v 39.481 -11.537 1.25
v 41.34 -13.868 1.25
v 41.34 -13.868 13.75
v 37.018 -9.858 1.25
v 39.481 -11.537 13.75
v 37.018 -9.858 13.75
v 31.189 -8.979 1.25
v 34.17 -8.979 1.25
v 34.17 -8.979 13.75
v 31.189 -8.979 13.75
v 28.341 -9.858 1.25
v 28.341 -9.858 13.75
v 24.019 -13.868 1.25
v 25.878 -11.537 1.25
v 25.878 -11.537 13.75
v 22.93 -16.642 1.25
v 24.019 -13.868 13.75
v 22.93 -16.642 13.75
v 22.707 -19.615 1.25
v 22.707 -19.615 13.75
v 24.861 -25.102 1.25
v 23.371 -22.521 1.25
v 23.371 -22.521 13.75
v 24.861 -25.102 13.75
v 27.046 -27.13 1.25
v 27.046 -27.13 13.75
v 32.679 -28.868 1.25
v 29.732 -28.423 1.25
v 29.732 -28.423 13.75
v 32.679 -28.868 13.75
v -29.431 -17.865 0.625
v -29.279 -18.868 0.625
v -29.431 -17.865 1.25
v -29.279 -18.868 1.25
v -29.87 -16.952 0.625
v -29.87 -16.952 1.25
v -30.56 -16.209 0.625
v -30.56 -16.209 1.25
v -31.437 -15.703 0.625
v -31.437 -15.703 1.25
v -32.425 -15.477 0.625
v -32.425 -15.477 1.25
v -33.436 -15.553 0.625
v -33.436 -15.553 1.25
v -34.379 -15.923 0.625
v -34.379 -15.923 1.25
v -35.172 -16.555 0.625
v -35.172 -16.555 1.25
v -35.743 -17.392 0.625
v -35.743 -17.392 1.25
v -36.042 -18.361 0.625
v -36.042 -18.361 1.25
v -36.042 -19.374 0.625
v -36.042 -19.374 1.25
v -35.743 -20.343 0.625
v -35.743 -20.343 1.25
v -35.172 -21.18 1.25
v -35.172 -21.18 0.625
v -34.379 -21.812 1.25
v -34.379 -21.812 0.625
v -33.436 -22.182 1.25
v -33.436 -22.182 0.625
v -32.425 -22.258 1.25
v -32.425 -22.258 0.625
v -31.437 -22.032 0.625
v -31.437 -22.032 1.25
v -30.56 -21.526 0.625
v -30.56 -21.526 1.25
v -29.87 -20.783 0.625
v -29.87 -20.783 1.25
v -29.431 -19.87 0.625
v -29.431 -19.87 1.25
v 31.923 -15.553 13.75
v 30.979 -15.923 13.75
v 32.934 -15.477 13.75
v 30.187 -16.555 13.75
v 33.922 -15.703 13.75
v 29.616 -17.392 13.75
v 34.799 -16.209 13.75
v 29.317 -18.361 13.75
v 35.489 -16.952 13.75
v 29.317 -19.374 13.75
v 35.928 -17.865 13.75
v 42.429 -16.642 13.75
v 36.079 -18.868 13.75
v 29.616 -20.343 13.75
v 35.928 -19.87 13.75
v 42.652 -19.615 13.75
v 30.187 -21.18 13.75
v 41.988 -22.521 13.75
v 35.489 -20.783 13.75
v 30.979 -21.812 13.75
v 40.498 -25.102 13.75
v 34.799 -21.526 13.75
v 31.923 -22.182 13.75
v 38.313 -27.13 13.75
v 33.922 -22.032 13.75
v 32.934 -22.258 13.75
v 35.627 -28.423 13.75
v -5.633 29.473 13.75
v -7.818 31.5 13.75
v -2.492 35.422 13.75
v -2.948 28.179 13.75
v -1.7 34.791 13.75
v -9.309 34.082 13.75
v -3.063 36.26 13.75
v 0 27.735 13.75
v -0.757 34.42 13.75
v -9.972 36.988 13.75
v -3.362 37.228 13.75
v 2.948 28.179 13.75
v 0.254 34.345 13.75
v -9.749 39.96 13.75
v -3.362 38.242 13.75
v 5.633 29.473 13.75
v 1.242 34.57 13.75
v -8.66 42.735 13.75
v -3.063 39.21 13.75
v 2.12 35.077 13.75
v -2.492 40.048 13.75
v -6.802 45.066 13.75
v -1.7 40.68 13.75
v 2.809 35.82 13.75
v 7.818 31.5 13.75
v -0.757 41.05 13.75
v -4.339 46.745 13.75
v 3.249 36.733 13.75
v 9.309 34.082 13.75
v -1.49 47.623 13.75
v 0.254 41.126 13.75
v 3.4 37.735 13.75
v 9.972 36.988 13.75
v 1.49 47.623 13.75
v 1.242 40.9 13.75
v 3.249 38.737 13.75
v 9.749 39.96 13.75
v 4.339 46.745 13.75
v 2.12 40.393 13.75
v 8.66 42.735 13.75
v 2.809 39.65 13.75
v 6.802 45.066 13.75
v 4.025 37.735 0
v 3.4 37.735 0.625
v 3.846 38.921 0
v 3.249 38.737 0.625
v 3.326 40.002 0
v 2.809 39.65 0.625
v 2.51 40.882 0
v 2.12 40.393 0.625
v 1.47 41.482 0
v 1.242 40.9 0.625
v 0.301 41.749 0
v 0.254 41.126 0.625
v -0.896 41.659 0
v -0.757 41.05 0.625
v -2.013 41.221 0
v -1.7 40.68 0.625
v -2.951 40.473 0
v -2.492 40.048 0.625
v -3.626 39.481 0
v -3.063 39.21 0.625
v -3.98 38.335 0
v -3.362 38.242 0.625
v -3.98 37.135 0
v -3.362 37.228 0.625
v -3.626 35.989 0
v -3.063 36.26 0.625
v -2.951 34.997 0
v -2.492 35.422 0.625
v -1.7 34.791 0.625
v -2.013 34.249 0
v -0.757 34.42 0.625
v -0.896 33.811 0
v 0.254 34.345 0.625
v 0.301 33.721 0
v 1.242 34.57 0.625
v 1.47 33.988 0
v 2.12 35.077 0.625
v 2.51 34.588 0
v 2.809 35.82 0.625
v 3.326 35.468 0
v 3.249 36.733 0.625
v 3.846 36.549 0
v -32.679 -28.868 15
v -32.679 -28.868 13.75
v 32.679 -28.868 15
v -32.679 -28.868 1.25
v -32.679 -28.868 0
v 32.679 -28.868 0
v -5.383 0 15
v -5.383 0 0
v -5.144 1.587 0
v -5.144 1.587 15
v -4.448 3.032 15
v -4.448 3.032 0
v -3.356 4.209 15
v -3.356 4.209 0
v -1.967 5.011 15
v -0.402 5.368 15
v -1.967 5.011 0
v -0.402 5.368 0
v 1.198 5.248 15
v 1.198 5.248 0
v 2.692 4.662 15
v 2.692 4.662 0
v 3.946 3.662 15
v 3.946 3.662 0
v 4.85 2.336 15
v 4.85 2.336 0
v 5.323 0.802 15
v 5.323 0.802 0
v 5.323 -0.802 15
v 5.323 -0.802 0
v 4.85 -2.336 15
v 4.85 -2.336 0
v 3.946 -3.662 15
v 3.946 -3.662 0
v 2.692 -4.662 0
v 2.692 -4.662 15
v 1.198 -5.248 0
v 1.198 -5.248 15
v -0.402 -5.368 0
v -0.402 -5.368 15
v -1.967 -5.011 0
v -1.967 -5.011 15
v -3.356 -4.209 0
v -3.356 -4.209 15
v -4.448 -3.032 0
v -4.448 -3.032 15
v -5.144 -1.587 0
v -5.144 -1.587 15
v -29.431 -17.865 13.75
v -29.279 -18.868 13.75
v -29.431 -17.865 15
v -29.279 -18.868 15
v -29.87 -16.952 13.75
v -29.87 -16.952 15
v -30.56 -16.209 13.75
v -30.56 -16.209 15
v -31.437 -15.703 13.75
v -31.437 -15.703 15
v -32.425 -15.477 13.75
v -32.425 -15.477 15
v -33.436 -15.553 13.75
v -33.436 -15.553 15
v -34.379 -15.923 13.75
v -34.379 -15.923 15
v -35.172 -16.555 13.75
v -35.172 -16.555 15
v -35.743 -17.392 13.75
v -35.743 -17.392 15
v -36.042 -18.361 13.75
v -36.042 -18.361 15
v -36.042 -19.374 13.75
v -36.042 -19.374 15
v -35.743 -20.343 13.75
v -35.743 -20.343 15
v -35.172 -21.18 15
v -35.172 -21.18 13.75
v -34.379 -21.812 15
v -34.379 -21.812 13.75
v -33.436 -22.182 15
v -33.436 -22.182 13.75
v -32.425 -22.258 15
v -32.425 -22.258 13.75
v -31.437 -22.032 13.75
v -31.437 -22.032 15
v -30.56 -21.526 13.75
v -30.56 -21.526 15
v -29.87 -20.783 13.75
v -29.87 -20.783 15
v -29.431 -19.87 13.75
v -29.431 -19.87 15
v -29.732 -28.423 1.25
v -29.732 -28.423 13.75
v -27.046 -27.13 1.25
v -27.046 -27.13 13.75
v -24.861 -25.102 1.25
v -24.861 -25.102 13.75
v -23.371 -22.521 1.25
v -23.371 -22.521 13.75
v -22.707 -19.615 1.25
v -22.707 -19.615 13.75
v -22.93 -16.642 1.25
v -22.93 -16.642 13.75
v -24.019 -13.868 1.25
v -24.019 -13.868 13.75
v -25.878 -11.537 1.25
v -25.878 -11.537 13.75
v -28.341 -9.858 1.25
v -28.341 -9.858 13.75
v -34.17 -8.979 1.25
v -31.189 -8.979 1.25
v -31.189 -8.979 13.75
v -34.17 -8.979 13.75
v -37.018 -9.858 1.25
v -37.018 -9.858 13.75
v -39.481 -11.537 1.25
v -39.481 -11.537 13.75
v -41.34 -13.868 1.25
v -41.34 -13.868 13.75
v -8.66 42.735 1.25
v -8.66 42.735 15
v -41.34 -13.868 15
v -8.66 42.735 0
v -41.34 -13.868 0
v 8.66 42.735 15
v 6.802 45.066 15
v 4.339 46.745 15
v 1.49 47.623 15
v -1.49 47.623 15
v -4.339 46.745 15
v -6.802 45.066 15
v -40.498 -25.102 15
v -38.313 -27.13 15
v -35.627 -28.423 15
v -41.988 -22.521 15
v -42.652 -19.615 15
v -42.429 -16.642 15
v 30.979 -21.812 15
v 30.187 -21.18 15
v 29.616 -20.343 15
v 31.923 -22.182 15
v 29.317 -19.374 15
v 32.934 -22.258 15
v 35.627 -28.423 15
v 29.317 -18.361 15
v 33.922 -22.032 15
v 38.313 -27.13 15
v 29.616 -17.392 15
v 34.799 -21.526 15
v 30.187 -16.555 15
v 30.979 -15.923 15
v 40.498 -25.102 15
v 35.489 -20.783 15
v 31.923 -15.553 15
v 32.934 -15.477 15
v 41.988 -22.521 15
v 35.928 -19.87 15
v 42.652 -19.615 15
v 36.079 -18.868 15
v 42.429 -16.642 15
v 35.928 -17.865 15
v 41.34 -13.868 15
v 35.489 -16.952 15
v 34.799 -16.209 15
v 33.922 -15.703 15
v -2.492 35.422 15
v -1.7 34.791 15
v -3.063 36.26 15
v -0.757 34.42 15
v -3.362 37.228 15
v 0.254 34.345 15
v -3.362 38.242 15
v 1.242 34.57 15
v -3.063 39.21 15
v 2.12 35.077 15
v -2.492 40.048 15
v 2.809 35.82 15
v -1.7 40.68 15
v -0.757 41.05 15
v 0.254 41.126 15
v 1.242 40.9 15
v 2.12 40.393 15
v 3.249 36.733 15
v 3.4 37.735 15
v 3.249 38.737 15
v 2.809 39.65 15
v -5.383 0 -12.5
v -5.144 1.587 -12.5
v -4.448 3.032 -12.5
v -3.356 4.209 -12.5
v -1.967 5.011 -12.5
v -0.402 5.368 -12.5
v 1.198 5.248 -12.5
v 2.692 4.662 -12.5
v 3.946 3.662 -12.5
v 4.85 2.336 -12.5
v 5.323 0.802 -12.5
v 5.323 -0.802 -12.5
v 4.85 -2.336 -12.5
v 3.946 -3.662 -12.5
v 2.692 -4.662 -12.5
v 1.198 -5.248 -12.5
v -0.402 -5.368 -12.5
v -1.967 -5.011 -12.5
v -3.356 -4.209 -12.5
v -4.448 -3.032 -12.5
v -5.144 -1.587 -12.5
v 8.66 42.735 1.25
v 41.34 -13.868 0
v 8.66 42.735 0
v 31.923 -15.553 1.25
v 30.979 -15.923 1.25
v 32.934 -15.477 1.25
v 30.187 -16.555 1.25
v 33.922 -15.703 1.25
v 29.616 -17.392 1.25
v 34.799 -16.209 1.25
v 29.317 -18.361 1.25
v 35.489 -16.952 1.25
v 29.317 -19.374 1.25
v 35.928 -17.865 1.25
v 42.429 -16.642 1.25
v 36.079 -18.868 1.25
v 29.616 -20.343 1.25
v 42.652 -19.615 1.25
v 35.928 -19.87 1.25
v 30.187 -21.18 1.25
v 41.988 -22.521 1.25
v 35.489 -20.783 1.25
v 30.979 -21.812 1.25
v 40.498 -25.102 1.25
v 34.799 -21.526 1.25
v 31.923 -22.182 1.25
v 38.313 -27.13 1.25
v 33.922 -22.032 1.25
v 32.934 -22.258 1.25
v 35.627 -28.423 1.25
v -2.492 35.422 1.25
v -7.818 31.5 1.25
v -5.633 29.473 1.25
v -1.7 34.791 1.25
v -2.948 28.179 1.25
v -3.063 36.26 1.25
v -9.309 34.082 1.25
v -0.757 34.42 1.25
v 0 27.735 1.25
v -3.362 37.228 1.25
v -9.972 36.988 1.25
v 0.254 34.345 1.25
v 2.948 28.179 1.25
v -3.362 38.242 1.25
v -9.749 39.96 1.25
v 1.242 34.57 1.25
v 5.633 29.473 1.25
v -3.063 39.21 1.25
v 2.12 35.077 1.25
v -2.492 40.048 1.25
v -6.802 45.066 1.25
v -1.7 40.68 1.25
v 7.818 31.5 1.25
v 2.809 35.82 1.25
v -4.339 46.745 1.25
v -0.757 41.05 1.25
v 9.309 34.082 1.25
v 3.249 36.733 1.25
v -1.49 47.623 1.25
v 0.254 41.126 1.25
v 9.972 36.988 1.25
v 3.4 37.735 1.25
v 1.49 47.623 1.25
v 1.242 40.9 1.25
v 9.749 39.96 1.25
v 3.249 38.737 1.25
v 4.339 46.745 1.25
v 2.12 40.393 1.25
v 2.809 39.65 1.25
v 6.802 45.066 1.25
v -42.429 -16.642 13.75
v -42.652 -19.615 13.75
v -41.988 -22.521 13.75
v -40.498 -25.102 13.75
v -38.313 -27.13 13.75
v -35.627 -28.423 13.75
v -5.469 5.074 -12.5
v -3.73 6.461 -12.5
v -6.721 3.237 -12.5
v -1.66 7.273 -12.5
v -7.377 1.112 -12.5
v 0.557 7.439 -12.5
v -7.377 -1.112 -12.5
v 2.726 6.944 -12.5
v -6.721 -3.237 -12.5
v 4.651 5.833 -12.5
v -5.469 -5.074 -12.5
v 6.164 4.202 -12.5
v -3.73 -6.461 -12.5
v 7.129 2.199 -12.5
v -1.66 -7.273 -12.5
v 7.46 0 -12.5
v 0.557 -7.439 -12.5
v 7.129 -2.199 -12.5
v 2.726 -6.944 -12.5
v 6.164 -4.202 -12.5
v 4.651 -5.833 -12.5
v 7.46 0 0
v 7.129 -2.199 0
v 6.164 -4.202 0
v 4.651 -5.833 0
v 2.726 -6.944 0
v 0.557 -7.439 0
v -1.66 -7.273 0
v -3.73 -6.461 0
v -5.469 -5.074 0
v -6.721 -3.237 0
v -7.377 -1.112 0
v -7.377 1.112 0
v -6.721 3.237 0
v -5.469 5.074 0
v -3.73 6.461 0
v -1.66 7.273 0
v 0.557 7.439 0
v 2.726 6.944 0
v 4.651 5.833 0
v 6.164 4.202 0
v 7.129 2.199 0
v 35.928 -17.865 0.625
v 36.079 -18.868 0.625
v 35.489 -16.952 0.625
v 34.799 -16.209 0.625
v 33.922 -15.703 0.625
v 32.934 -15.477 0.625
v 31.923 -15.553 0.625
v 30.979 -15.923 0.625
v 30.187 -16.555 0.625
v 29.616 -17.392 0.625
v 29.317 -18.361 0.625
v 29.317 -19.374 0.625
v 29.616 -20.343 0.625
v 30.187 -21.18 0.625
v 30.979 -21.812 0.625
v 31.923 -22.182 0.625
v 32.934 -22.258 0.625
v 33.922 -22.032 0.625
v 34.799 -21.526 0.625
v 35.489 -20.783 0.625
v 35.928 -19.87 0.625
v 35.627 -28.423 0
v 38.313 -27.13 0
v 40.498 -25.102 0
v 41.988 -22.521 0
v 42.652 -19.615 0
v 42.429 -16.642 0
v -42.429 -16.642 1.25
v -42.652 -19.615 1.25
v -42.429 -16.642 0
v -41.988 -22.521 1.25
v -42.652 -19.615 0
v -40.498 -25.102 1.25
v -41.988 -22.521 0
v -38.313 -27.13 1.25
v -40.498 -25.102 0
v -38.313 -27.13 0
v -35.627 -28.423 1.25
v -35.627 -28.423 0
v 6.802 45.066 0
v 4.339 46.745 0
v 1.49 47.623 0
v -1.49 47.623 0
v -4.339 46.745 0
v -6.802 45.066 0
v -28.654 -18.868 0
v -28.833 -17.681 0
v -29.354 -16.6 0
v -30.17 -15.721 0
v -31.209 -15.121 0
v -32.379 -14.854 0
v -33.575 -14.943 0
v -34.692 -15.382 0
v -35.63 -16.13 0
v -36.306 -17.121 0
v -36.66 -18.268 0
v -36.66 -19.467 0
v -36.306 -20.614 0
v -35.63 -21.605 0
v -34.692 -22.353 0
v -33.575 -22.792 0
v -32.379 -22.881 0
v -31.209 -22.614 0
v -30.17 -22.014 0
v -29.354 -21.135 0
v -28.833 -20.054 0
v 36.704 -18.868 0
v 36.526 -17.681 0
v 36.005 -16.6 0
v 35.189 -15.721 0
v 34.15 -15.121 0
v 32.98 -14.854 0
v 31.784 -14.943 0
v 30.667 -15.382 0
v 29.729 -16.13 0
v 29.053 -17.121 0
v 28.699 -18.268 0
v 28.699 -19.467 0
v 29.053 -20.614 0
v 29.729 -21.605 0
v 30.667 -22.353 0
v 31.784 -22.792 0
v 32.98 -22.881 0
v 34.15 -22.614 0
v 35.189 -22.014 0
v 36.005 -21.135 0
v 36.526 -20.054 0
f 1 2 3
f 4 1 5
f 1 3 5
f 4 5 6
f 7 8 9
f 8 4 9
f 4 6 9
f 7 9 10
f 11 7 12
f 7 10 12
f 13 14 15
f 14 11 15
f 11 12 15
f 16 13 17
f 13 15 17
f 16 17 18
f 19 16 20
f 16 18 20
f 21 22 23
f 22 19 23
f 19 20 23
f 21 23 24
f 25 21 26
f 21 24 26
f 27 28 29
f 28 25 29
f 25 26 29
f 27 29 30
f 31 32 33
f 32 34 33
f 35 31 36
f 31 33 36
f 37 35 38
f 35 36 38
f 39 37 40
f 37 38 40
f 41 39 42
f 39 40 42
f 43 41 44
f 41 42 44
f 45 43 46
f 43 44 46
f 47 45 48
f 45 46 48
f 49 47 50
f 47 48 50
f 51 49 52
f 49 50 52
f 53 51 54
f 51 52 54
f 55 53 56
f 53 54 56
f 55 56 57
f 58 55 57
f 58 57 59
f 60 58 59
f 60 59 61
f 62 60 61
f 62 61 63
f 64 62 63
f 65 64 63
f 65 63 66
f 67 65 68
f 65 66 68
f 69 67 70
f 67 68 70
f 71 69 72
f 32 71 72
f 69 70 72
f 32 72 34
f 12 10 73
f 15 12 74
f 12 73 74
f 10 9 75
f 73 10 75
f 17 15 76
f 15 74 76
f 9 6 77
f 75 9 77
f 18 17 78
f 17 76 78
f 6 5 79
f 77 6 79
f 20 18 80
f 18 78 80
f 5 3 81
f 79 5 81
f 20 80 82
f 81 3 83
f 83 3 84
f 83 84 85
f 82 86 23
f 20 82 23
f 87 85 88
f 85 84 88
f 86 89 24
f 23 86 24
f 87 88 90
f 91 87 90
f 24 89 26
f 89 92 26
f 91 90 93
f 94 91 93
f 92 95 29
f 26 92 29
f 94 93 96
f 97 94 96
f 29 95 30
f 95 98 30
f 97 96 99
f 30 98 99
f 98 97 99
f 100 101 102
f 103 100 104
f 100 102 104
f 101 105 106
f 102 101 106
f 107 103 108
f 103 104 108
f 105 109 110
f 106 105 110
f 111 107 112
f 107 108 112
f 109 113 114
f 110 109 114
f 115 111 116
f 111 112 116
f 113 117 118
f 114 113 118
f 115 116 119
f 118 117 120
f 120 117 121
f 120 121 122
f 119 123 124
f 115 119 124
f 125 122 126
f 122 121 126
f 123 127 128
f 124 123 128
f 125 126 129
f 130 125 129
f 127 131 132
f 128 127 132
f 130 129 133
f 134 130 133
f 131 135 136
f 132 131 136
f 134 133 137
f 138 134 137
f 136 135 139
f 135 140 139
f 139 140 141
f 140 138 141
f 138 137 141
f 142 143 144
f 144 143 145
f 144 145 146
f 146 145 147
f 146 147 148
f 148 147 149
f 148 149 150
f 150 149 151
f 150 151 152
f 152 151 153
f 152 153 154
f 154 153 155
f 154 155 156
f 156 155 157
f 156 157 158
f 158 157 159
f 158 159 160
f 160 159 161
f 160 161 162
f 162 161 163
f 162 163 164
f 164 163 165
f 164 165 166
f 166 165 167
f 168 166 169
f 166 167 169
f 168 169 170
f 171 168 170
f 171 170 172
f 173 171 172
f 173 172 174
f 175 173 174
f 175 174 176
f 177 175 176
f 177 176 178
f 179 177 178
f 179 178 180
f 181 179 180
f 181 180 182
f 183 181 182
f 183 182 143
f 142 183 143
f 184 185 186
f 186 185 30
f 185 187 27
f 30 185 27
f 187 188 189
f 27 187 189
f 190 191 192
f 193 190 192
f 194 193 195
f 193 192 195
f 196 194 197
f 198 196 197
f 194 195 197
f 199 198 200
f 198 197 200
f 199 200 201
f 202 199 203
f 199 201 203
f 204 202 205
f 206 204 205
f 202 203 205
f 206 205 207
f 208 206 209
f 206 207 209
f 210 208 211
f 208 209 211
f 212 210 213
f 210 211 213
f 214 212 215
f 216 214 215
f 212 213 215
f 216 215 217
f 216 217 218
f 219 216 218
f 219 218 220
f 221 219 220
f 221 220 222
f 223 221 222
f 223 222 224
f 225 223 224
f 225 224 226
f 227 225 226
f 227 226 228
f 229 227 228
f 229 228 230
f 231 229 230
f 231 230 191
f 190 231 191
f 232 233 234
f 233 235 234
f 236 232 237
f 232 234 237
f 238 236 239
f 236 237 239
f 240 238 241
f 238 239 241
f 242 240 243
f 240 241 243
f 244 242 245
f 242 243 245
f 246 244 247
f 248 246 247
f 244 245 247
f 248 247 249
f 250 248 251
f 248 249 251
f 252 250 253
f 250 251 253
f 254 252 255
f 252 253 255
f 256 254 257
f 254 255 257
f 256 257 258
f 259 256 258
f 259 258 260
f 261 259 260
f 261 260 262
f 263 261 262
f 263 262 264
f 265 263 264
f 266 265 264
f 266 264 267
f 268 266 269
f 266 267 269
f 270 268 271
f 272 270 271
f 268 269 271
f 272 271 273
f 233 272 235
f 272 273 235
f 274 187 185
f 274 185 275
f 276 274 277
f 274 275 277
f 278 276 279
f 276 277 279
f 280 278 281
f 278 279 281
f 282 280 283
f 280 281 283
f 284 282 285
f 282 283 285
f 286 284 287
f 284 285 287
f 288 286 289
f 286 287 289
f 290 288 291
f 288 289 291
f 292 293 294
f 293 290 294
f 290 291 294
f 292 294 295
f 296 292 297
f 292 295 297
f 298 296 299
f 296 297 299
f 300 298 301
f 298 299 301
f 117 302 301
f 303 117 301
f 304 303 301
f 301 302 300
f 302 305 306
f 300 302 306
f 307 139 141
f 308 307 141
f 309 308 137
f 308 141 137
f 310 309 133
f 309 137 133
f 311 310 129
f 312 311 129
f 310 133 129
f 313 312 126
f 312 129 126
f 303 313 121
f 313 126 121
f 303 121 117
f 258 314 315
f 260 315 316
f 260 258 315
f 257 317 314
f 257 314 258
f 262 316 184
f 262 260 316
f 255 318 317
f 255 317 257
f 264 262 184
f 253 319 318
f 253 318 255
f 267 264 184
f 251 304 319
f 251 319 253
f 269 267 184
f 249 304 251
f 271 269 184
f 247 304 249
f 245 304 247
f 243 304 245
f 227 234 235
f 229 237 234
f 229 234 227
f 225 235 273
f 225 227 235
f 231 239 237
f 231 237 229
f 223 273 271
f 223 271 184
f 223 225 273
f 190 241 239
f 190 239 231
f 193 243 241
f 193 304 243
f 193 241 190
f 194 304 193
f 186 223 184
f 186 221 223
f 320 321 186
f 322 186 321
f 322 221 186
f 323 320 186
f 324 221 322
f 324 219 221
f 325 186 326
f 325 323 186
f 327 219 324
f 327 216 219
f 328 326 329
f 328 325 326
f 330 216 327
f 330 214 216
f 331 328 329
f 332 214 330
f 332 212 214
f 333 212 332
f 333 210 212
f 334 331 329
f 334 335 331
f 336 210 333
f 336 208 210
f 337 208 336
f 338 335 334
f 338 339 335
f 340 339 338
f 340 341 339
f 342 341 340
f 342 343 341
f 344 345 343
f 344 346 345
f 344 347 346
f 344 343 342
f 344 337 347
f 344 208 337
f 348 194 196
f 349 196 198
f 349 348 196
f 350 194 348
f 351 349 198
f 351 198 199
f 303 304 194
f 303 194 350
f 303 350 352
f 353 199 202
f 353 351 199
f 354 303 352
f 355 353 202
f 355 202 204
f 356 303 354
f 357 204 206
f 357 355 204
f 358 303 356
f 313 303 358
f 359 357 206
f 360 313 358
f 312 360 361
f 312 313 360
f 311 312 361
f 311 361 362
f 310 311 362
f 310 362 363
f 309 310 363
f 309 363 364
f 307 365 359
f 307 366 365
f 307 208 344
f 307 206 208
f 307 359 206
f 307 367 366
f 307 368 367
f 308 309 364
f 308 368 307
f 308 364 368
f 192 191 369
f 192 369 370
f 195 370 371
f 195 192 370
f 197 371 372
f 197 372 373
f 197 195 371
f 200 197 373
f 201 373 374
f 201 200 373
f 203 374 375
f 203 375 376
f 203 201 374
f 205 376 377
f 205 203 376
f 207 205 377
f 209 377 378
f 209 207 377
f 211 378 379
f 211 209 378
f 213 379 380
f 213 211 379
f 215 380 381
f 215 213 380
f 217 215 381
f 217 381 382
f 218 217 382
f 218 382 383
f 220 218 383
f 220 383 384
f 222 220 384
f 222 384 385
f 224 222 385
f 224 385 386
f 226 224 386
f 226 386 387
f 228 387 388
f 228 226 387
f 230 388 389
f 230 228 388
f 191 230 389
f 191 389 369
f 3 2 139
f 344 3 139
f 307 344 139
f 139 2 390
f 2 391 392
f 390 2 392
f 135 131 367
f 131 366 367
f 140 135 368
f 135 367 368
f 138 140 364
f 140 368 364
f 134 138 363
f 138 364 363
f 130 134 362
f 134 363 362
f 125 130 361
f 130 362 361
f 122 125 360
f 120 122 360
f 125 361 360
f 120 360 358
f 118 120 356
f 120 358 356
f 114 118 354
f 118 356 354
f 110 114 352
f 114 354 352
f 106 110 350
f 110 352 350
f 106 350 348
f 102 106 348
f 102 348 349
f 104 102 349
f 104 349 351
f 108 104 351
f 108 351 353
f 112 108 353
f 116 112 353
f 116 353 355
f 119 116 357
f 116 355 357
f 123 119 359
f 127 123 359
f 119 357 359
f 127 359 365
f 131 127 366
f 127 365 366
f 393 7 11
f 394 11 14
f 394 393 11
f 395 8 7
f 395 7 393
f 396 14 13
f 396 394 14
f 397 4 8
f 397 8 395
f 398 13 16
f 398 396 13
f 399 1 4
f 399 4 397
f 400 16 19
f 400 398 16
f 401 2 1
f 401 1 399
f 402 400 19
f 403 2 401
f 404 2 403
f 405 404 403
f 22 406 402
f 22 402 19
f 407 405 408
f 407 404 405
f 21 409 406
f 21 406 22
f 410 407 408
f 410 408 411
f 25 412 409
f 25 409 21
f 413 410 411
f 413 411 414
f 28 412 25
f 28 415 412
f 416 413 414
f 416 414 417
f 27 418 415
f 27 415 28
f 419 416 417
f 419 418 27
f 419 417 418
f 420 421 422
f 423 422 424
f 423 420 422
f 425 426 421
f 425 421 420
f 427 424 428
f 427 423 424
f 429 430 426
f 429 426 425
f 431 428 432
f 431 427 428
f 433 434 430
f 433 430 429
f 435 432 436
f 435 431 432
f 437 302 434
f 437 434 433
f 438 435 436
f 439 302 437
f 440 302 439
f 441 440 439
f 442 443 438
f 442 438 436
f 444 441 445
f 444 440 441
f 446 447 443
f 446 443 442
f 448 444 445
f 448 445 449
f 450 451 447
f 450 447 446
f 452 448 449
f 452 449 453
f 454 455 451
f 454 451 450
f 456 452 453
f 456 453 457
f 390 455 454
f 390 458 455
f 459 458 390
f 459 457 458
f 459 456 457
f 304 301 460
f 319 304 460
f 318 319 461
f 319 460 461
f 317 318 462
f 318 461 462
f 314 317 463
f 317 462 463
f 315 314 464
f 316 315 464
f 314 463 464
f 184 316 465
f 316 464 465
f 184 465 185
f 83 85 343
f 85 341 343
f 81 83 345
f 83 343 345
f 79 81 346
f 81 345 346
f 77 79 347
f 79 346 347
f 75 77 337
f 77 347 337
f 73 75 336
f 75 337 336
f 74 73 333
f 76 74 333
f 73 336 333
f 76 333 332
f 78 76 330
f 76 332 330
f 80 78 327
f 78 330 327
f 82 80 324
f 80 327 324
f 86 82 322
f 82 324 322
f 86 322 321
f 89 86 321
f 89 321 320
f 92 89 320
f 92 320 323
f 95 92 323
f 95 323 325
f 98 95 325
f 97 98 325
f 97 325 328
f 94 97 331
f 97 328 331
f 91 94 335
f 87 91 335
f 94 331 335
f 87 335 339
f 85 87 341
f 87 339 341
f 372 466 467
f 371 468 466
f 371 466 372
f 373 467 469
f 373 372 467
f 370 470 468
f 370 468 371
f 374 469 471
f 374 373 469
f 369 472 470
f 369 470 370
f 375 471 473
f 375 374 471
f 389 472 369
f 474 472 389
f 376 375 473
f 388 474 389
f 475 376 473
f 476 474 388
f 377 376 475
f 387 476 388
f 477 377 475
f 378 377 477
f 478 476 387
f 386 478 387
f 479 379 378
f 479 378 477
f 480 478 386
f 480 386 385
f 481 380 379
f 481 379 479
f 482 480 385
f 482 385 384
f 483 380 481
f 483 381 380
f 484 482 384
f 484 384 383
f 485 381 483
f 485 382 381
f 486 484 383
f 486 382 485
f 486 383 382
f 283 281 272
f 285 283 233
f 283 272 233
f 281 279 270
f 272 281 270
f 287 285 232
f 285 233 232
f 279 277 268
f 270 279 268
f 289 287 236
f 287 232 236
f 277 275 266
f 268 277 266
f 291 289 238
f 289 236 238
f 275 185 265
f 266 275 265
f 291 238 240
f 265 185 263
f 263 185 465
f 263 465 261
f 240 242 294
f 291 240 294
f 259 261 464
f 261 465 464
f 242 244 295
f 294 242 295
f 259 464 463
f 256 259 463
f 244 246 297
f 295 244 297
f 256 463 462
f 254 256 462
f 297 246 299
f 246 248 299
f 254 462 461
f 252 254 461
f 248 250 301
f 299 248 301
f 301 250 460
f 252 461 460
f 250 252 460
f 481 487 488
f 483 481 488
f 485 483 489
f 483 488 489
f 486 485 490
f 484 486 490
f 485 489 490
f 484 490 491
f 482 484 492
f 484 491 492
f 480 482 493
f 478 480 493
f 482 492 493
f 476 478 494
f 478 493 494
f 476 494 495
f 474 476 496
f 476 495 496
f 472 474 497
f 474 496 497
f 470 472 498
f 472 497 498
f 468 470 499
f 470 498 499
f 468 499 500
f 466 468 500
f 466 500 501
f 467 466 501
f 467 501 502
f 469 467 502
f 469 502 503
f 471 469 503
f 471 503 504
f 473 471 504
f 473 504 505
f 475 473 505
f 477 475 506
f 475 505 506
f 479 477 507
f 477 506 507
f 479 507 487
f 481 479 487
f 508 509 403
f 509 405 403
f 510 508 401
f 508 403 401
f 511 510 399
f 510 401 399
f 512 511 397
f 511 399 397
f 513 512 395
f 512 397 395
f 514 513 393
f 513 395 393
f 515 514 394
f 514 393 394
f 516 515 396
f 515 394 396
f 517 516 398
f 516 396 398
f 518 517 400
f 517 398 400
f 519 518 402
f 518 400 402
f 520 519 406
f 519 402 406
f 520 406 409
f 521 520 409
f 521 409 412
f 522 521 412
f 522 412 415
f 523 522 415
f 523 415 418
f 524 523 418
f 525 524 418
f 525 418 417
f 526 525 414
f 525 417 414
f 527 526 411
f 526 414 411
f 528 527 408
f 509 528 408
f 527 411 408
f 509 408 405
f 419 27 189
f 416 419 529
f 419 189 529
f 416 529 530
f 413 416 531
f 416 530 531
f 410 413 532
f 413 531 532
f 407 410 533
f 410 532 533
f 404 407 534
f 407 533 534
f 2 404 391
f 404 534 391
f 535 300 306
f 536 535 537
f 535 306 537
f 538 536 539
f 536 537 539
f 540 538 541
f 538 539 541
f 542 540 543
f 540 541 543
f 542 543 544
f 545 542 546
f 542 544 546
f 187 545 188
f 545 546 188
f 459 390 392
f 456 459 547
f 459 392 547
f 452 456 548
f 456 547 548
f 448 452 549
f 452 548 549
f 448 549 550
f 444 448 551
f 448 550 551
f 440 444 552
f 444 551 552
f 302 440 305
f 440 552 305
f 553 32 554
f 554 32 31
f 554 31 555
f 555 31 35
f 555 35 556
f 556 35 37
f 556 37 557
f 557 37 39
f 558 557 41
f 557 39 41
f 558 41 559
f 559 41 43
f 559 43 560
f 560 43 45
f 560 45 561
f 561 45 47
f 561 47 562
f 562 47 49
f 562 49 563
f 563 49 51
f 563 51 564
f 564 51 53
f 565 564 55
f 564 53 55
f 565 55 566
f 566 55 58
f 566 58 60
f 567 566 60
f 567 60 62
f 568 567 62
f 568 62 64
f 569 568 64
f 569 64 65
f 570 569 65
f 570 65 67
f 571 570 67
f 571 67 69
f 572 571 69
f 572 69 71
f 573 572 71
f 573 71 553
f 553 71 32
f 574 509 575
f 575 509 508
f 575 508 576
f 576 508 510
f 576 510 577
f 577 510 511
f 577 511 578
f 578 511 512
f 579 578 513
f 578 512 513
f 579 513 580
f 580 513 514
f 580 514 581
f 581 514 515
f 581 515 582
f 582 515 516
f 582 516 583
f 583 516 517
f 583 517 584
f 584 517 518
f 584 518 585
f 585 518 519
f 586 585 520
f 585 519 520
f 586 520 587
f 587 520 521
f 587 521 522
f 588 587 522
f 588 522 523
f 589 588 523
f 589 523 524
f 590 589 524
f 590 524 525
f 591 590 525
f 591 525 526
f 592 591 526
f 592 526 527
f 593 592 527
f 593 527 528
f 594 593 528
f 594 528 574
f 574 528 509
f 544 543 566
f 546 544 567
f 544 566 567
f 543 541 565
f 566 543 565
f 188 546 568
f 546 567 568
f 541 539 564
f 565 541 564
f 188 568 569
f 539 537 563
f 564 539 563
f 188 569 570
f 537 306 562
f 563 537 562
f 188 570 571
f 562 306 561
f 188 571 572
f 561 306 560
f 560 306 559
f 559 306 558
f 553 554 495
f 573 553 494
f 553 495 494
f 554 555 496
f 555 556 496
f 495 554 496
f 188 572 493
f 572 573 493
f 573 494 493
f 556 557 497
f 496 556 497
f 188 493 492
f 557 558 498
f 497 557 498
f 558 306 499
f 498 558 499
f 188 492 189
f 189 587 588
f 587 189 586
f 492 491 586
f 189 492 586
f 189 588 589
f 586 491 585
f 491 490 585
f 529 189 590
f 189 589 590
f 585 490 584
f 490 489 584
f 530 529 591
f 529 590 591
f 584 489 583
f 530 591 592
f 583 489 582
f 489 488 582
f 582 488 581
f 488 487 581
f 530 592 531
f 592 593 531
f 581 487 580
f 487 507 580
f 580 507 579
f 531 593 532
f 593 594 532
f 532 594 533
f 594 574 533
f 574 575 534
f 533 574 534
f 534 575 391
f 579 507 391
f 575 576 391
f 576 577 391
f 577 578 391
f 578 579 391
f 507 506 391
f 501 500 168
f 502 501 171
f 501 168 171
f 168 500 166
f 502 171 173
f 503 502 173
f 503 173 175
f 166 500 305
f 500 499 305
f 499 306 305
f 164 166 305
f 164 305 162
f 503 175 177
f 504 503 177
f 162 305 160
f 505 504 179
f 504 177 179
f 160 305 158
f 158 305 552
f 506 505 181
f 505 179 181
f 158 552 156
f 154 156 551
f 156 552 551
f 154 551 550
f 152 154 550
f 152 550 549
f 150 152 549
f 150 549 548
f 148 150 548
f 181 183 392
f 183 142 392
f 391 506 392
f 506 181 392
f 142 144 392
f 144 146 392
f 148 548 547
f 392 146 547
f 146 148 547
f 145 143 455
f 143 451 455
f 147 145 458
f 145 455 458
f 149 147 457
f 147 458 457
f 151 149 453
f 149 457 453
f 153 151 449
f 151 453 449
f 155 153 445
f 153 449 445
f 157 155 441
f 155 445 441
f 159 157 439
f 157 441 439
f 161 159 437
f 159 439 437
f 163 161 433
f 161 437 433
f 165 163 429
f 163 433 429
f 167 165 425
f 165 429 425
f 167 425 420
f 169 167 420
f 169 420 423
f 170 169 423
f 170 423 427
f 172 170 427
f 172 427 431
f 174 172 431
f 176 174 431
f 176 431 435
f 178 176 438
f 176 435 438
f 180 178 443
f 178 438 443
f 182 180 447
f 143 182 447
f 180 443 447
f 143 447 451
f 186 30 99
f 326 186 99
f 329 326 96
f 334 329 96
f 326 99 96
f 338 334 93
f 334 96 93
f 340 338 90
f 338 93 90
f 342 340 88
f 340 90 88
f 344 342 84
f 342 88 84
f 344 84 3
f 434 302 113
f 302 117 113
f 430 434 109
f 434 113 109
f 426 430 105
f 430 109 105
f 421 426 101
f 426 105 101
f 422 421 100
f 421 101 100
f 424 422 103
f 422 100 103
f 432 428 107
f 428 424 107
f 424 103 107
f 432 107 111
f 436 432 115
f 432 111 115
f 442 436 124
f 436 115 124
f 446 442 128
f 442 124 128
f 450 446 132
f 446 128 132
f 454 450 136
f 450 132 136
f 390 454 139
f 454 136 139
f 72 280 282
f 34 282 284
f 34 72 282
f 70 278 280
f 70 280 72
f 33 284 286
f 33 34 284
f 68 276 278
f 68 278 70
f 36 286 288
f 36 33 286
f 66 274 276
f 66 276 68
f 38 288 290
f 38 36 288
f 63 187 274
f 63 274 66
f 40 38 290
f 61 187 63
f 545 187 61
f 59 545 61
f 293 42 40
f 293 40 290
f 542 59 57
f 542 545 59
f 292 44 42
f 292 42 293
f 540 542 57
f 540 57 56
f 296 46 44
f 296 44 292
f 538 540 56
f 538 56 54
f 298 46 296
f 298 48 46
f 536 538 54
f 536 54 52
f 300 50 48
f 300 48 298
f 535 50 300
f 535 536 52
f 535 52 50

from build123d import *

# Parameters (mm, degrees)
BOSS_EXTRU_1_DEPTH           = 15
ENL_V_START                  = 7.5
ESQUISSE2_R                  = 10
ENL_V_MAT_EXTRU_1_DEPTH      = 6.25
R_P_TITION_CIRCULAIRE1_COUNT = 3
TROU_TARAUD_M81_D            = 6.8
TROU_TARAUD_M81_CSINK_D      = 8.05
TROU_TARAUD_M81_CSINK_ANGLE  = 90
ESQUISSE7_R                  = 7.460158596
ESQUISSE7_R_2                = 5.383247208
BOSS_EXTRU_2_DEPTH           = 12.5
ESQUISSE7_3_R                = 5.383247208
ENL_V_MAT_EXTRU_2_DEPTH      = 66.766038545


with BuildPart() as part:
    # Esquisse1 → Boss.-Extru.1 (new body)
    with BuildSketch(Plane.XY):
        with BuildLine():
            Line((-8.660254038, 42.735026919), (-41.339745962, -13.867513459))
            ThreePointArc((-41.339745962, -13.867513459), (-41.339745962, -23.867513459), (-32.679491924, -28.867513459))
            Line((-32.679491924, -28.867513459), (32.679491924, -28.867513459))
            ThreePointArc((32.679491924, -28.867513459), (41.339745962, -23.867513459), (41.339745962, -13.867513459))
            Line((41.339745962, -13.867513459), (8.660254038, 42.735026919))
            ThreePointArc((8.660254038, 42.735026919), (0, 47.735026919), (-8.660254038, 42.735026919))
        make_face()
    extrude(amount=BOSS_EXTRU_1_DEPTH)

    # Esquisse2 → Enlèv. mat.-Extru.1 (cut, symmetric)
    with BuildSketch(Plane.XY.offset(ENL_V_START)):
        with Locations((0, 37.735026919)):
            Circle(ESQUISSE2_R)
    enl_v_mat_extru_1 = extrude(amount=ENL_V_MAT_EXTRU_1_DEPTH, both=True, mode=Mode.SUBTRACT)

    # Répétition circulaire1: Enlèv. mat.-Extru.1 ×3 about axis
    r_p_tition_circulaire1_axis = Axis((0, 0, -0.550606868), (0, 0, -1))
    for i in range(1, R_P_TITION_CIRCULAIRE1_COUNT):
        add(enl_v_mat_extru_1.rotate(r_p_tition_circulaire1_axis, i * 360 / R_P_TITION_CIRCULAIRE1_COUNT), mode=Mode.SUBTRACT)

    # Trou taraudé M81 (through all)
    with Locations(Plane(origin=(0, 0, 0), x_dir=(-1, 0, 0), z_dir=(0, 0, -1))):
        with Locations((0, 37.735026919), (32.679491924, -18.867513459), (-32.679491924, -18.867513459)):
            CounterSinkHole(TROU_TARAUD_M81_D / 2, TROU_TARAUD_M81_CSINK_D / 2, counter_sink_angle=TROU_TARAUD_M81_CSINK_ANGLE)

    # Esquisse7 → Boss.-Extru.2 (add)
    with BuildSketch(Plane(origin=(0, 0, 0), x_dir=(-1, 0, 0), z_dir=(0, 0, -1))):
        Circle(ESQUISSE7_R)
        Circle(ESQUISSE7_R_2, mode=Mode.SUBTRACT)
    extrude(amount=BOSS_EXTRU_2_DEPTH)

    # Esquisse7<3> → Enlèv. mat.-Extru.2 (cut, through all)
    with BuildSketch(Plane(origin=(0, 0, 0), x_dir=(-1, 0, 0), z_dir=(0, 0, -1))):
        Circle(ESQUISSE7_3_R)
    extrude(amount=-ENL_V_MAT_EXTRU_2_DEPTH, mode=Mode.SUBTRACT)


solid = part.part
